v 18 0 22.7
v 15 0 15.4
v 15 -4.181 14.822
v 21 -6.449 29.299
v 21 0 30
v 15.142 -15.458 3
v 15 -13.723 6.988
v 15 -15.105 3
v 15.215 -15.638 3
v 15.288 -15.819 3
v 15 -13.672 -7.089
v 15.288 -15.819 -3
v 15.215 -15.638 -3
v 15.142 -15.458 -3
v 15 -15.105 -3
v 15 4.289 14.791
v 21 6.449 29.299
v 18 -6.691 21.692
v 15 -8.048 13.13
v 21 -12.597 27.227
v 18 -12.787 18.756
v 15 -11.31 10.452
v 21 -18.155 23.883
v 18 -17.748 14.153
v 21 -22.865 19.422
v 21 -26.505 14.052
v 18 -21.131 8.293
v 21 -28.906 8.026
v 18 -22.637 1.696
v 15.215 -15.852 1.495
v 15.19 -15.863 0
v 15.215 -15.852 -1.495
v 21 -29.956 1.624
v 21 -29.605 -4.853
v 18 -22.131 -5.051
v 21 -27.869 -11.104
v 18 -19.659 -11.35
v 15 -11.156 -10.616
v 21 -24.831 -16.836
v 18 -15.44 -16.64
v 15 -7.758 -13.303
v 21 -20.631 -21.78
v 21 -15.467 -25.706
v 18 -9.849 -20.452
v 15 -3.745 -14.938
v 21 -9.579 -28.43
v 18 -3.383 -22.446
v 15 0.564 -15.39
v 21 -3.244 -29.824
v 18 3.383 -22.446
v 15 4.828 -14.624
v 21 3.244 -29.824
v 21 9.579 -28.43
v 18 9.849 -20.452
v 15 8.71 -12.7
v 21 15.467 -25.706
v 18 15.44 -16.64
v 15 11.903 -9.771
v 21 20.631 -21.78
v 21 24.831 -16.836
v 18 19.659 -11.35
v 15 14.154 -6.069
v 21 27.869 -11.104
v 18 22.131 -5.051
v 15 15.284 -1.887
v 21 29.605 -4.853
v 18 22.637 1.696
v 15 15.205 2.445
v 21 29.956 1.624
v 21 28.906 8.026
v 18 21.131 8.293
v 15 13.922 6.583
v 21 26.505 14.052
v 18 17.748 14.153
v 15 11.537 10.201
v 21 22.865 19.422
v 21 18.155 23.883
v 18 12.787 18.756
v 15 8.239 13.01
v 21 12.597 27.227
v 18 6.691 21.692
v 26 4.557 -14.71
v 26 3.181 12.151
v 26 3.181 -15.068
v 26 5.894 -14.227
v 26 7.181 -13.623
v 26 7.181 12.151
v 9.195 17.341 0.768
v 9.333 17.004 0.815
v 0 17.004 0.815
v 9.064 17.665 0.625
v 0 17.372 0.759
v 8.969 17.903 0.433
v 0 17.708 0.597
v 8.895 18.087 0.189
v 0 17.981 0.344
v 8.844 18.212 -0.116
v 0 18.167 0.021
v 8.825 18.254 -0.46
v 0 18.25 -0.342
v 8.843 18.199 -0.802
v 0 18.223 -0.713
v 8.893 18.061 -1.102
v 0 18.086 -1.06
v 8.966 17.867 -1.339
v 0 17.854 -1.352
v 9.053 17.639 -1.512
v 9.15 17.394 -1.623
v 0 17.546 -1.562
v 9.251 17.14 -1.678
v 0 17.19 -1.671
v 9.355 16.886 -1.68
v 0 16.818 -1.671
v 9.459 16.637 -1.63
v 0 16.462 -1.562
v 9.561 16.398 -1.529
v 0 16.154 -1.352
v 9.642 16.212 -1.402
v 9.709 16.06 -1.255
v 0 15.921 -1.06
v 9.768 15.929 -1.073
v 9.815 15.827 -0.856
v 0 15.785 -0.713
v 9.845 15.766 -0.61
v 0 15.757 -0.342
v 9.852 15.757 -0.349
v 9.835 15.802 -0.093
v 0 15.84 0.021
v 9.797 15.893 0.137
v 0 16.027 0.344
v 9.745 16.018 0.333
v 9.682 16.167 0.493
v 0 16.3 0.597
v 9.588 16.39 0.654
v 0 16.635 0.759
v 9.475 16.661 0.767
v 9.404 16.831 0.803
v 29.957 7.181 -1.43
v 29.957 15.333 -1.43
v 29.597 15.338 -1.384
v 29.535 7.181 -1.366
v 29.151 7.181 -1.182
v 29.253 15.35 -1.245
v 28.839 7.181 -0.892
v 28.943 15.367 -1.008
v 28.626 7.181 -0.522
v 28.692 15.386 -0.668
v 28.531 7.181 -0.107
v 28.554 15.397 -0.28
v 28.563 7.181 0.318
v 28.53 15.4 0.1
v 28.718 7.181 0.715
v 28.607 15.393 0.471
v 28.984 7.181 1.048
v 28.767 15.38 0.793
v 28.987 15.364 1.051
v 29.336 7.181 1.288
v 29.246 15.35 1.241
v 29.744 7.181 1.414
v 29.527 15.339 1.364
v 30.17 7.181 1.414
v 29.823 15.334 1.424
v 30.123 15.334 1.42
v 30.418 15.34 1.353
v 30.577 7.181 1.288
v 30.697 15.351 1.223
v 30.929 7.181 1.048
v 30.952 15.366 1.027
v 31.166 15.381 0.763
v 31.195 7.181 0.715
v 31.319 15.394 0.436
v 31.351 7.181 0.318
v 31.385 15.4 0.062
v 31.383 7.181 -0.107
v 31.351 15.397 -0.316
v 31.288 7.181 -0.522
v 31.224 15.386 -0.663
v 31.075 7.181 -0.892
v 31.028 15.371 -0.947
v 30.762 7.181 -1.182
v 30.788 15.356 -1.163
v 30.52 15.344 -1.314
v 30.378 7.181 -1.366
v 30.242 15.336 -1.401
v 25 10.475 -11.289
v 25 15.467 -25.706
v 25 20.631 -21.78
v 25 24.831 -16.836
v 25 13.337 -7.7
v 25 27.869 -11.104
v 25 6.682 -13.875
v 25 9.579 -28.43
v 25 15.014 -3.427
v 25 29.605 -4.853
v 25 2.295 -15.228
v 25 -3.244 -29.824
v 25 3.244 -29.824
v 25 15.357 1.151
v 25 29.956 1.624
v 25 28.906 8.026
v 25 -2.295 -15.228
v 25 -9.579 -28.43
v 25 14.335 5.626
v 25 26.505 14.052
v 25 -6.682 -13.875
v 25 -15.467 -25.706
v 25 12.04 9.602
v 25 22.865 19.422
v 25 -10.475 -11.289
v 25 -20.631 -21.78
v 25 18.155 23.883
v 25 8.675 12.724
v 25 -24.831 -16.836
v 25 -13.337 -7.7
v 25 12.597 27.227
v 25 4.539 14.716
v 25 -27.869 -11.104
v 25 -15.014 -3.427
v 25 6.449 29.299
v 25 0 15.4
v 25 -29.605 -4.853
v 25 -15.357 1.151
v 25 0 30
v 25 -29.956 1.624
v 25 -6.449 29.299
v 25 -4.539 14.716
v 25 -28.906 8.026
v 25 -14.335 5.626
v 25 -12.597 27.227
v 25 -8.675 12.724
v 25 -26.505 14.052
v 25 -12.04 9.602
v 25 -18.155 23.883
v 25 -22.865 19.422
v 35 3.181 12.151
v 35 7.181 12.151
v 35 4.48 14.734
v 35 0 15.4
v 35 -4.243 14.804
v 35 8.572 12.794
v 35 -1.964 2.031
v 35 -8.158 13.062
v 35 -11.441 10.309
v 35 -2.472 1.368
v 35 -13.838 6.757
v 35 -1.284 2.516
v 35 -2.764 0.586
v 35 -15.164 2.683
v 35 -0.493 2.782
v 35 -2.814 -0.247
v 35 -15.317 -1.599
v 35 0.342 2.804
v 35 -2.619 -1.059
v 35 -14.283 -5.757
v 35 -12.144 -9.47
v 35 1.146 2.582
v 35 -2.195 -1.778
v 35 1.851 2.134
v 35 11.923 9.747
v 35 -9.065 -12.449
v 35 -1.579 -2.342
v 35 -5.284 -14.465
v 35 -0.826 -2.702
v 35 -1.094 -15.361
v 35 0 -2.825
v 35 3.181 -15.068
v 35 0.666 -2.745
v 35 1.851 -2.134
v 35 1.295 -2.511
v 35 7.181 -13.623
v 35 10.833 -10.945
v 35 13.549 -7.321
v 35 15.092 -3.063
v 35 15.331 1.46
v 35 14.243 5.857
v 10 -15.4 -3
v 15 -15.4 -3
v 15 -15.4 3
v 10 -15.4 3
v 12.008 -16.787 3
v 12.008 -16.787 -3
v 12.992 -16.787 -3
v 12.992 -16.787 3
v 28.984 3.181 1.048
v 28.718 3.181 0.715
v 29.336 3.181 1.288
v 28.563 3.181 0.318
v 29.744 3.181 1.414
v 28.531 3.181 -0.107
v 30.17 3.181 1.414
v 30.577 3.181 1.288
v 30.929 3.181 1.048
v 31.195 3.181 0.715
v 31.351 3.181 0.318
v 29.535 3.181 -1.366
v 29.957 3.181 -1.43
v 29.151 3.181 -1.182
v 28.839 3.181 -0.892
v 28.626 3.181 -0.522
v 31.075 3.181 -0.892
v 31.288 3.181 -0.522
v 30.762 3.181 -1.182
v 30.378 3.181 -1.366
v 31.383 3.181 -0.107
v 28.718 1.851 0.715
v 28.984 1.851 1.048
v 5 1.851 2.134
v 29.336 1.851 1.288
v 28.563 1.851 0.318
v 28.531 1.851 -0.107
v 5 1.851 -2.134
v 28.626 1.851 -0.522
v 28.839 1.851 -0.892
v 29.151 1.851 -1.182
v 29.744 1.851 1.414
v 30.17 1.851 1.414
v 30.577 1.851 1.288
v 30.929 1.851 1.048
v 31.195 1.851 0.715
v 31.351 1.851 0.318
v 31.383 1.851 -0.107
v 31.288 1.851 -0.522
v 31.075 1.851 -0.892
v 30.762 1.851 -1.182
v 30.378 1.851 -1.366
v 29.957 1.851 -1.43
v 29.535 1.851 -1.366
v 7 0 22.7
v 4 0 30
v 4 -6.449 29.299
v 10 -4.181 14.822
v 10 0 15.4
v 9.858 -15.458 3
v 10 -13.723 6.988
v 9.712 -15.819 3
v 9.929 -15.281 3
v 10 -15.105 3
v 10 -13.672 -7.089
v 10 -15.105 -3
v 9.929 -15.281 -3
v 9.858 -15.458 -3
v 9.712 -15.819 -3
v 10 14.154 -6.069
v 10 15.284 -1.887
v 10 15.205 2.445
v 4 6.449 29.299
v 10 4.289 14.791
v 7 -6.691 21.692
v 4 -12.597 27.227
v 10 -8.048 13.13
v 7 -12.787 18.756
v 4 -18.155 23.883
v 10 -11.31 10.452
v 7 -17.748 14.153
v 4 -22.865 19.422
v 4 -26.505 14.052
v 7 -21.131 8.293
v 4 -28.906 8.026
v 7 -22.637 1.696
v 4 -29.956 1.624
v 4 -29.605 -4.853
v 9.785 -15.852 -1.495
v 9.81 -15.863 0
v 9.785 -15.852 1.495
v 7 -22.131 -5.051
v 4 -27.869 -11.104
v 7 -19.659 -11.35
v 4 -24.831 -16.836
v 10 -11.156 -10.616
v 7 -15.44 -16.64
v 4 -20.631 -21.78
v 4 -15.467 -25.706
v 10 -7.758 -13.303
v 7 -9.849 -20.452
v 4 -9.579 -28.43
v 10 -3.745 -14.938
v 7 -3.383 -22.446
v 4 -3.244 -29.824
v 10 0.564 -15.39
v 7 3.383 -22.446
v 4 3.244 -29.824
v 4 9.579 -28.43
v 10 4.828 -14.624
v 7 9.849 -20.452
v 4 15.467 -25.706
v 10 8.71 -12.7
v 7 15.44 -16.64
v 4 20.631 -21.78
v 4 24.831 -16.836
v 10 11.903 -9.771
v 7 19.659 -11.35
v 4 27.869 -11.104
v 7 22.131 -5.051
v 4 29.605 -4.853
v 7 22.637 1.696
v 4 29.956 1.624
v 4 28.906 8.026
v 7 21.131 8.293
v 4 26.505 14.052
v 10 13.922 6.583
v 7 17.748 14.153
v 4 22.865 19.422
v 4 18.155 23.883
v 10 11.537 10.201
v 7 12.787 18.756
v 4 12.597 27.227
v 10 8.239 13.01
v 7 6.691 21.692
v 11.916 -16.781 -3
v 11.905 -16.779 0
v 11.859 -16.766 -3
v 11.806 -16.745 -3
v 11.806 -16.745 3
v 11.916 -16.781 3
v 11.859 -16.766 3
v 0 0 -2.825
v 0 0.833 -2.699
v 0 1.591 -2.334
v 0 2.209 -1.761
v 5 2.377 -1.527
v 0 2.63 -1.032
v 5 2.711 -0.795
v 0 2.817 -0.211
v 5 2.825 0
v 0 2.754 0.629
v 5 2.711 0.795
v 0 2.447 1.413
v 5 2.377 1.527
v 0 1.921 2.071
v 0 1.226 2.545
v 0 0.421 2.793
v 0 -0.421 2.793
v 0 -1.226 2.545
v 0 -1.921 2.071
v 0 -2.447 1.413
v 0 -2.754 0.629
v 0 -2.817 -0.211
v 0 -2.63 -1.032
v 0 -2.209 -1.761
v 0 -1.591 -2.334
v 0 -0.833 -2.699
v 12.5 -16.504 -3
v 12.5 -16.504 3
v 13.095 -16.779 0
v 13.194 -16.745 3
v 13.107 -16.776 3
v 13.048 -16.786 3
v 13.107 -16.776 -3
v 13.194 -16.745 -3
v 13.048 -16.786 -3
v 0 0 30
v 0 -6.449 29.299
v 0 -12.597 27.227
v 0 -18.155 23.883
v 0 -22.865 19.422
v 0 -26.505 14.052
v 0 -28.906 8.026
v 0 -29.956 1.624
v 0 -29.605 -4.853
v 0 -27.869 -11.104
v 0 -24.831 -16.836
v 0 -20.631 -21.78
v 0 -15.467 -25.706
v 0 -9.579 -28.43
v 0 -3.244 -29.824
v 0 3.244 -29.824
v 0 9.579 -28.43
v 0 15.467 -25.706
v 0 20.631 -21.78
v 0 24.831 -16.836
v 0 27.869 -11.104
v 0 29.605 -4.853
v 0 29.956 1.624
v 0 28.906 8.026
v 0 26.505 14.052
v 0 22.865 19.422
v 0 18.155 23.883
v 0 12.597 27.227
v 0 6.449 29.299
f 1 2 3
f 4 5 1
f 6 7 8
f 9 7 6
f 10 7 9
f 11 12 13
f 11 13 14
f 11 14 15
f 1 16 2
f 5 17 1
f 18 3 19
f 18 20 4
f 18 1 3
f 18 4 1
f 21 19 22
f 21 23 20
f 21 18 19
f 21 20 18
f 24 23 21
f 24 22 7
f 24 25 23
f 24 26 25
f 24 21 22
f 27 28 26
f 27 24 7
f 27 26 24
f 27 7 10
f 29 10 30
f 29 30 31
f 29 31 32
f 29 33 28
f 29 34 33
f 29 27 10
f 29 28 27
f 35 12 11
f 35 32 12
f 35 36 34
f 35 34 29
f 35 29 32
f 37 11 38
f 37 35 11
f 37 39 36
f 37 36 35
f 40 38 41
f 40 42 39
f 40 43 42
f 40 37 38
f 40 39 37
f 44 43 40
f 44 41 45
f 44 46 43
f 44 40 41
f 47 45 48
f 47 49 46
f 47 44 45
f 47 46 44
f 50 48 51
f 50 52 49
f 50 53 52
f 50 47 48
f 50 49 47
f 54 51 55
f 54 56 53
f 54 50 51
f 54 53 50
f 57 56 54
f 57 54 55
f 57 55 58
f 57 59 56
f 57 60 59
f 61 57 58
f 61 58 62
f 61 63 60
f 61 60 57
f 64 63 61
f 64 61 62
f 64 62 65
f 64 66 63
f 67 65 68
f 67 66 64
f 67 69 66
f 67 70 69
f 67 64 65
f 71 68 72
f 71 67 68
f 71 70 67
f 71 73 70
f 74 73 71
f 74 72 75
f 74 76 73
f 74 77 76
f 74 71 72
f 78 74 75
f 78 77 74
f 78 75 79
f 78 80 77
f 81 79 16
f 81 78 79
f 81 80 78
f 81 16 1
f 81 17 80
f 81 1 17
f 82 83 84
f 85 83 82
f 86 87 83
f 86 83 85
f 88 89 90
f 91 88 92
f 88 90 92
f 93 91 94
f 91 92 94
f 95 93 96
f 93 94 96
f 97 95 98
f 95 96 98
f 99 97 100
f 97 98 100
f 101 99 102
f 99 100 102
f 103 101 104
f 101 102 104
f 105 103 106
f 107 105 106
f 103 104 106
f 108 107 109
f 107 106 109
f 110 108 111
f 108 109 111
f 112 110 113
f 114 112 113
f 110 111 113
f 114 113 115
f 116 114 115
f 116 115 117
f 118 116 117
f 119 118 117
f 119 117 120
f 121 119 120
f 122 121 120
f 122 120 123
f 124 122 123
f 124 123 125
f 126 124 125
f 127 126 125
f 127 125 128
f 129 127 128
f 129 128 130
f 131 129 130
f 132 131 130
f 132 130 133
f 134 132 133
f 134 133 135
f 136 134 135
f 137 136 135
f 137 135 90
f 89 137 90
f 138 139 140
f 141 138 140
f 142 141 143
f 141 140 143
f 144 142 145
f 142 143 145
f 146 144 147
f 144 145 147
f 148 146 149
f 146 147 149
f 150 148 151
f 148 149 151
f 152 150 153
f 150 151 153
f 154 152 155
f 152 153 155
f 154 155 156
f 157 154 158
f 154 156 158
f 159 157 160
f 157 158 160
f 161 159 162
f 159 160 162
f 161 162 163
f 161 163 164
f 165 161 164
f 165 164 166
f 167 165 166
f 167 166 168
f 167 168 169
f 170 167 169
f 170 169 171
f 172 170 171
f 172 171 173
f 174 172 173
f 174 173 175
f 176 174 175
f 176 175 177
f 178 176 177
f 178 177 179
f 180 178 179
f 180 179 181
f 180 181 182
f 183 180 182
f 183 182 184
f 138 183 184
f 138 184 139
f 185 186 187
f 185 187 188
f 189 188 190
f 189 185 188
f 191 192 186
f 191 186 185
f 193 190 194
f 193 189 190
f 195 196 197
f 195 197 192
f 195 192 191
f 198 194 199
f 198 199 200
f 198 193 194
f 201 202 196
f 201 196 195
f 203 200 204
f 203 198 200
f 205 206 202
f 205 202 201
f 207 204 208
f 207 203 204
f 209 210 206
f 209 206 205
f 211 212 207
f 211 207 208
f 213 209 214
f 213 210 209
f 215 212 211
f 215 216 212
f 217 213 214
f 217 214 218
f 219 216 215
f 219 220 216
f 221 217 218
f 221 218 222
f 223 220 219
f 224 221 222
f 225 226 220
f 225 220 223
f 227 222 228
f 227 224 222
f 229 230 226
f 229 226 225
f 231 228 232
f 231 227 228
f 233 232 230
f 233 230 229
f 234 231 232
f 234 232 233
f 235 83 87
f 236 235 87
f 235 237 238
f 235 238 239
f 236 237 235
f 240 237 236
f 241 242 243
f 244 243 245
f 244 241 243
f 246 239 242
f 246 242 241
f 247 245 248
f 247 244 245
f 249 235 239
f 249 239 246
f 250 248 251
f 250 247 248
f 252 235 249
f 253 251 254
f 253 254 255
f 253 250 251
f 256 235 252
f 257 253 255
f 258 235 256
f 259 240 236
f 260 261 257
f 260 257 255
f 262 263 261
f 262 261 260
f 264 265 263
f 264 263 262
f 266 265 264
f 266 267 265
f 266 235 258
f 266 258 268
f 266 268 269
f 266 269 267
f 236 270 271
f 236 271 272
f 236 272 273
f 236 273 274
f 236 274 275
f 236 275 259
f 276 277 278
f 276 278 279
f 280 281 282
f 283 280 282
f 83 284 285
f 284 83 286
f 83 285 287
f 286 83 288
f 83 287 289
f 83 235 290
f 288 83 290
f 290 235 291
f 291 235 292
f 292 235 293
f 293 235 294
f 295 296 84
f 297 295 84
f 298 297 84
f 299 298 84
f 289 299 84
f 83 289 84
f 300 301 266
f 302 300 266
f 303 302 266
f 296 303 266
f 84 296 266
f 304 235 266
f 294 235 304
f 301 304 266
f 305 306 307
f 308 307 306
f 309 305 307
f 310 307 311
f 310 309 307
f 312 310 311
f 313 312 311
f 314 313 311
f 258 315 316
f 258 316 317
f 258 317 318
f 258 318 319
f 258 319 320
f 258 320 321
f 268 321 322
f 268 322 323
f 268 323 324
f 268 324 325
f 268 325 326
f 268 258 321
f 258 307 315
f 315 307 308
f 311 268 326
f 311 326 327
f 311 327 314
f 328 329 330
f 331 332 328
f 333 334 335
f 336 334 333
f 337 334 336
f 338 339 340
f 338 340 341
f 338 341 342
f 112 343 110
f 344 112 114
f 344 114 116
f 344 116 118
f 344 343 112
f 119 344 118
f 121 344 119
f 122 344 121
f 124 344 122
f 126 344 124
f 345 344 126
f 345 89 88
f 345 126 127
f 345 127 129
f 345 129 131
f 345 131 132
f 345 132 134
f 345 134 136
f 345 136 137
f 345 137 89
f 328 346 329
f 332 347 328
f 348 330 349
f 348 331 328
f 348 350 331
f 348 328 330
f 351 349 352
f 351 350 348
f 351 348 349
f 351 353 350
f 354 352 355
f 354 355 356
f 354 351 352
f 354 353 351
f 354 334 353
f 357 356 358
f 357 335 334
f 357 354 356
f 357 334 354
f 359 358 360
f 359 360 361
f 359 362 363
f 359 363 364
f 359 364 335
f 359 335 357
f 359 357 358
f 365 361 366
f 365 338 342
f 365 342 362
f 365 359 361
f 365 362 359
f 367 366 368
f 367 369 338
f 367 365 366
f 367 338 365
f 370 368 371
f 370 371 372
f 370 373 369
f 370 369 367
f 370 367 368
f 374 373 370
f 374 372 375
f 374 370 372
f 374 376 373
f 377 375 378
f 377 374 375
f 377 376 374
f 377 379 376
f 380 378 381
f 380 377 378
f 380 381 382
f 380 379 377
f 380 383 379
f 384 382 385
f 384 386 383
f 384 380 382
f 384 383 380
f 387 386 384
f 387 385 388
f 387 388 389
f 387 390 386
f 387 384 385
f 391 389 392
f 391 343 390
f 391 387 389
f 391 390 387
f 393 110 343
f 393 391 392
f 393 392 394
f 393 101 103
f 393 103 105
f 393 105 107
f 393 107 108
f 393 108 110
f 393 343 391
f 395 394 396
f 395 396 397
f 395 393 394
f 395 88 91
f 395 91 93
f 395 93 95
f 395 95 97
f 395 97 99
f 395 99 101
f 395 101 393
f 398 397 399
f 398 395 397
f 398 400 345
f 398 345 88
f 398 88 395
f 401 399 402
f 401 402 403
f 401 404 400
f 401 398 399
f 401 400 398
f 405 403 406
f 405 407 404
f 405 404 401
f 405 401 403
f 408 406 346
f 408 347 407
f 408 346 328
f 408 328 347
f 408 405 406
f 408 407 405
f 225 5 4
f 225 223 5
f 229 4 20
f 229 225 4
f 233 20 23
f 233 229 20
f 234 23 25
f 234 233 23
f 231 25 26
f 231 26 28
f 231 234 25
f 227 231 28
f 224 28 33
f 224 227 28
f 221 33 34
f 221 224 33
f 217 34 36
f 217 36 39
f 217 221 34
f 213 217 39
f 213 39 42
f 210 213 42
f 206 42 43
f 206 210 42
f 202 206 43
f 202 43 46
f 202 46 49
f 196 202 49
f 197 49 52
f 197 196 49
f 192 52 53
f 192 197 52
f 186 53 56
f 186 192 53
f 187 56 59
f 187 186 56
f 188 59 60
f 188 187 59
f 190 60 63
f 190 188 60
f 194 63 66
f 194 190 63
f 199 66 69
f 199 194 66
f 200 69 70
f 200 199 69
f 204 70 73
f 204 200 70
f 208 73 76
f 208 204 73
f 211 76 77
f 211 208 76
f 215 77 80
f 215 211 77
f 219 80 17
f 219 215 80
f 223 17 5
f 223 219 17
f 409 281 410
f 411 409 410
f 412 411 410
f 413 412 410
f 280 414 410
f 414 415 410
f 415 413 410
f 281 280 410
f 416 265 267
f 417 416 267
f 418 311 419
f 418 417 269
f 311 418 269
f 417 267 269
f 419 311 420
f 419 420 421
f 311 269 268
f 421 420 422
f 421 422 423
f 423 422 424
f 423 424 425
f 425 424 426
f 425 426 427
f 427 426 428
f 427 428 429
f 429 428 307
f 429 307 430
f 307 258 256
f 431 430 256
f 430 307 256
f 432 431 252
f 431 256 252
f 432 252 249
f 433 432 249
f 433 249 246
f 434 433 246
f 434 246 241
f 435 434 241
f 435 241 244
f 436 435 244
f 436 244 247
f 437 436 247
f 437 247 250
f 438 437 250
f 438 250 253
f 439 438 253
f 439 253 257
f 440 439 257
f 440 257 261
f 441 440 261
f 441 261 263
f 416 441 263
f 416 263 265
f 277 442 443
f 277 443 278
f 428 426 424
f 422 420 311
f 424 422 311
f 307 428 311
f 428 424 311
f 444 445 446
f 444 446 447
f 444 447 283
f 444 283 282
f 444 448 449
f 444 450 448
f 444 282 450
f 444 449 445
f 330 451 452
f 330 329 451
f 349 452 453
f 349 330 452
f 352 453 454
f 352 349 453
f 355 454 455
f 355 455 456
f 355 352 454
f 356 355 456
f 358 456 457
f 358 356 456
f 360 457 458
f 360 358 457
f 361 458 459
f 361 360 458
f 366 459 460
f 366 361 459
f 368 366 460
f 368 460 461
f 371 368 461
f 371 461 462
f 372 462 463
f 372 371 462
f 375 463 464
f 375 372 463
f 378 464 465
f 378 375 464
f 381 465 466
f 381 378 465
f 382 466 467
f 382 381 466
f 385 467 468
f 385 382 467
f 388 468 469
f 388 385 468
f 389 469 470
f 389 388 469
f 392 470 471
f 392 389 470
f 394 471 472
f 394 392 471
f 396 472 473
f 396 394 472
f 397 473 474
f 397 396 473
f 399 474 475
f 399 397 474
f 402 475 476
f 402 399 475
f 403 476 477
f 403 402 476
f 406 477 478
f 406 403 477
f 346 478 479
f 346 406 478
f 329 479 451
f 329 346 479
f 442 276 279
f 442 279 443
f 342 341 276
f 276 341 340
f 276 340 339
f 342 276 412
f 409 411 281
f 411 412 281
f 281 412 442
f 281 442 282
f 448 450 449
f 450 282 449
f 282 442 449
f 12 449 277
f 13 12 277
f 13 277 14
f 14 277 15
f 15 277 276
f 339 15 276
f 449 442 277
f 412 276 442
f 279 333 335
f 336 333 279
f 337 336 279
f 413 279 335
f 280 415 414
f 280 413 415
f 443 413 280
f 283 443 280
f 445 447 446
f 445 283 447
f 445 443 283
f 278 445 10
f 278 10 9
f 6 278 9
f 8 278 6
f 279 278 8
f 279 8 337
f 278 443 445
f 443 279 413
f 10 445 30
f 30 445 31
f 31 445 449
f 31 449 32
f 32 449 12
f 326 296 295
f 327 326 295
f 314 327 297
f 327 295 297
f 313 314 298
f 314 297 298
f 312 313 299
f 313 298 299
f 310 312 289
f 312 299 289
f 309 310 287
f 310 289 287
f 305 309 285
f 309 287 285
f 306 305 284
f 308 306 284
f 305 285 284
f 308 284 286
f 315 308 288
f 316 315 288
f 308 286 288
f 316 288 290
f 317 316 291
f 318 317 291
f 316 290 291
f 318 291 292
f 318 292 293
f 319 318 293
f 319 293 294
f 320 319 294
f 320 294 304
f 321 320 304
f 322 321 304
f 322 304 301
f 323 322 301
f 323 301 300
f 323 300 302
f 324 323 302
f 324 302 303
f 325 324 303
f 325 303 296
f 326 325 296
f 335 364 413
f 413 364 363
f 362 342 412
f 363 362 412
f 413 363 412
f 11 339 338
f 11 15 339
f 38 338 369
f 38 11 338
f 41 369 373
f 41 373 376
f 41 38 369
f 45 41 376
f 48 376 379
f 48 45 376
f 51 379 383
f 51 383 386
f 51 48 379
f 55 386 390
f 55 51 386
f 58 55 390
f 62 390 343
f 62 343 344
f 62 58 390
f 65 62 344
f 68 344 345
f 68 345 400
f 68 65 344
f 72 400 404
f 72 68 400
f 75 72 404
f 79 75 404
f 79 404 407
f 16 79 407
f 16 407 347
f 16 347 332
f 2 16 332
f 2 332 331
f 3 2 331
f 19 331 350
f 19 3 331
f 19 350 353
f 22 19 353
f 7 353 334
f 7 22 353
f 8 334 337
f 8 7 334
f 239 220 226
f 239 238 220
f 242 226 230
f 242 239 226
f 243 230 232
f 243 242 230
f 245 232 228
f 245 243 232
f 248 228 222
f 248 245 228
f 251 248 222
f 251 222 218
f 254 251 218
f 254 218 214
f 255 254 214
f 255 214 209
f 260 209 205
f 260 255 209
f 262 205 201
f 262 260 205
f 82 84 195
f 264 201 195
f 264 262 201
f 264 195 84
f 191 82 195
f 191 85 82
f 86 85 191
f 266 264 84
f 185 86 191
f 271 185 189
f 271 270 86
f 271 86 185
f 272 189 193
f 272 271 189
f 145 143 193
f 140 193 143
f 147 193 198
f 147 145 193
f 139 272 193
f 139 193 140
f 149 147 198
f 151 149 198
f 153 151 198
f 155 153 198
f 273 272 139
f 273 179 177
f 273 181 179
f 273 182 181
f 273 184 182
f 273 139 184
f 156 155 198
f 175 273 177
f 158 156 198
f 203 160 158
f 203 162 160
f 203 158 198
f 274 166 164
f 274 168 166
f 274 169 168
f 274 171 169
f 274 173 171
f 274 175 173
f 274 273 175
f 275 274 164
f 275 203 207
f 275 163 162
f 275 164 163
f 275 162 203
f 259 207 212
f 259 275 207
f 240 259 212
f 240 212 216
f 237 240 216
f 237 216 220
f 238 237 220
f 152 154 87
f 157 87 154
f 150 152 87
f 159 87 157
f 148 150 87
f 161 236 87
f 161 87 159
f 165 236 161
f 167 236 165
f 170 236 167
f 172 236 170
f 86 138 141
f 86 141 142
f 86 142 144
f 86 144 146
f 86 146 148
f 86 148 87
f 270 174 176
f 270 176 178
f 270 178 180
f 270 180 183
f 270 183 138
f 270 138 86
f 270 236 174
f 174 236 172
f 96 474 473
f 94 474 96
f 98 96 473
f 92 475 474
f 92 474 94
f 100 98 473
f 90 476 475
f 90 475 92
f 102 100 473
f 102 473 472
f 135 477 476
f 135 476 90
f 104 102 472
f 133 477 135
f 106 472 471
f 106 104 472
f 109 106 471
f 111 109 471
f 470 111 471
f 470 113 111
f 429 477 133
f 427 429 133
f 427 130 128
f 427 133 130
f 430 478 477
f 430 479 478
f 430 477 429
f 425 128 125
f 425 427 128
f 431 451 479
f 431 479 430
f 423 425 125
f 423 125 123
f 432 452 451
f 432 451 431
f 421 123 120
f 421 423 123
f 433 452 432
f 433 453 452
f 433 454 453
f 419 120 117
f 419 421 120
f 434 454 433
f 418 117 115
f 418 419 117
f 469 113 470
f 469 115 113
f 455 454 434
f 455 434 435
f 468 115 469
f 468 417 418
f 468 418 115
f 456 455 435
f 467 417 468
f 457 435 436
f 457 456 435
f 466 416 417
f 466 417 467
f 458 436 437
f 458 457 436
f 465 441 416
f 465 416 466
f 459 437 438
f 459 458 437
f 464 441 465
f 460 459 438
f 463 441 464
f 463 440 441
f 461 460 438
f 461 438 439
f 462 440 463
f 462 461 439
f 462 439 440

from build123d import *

# Parameters (mm, degrees)
SKETCH_3_R                = 2.825
CUT_EXTRUDE_2_DEPTH       = 35
SKETCH_14_R               = 1.25
CUT_EXTRUDE_5_DEPTH       = 12
SKETCH_16_W               = 5.008881277
SKETCH_16_H               = 1
EXTRUDE_2_DEPTH           = 30
SKETCH_19_W               = 0.959066555
SKETCH_19_H               = 0.511502163
EXTRUDE_3_DEPTH           = 30
SKETCH_24_W               = 27.218976977
SKETCH_24_H               = 4
CUT_EXTRUDE_8_DEPTH       = 9
SKETCH_25_R               = 1.43
CUT_EXTRUDE_9_DEPTH       = 22
EXTRUDE_4_DEPTH           = 3
EXTRUDE_4_DEPTH_BACK      = 3
CUT_EXTRUDE_12_DEPTH      = 3
CUT_EXTRUDE_12_DEPTH_BACK = 3


with BuildPart() as part:
    # 草圖1 → 旋轉1 (revolve)
    with BuildSketch(Plane.XY, mode=Mode.PRIVATE) as revolve_1_sk:
        Polygon((0, 0), (0, 30), (4, 30), (10, 15.4), (15, 15.4), (21, 30), (25, 30), (25, 15.4), (35, 15.4), (35, 0), align=None)
    revolve(revolve_1_sk.sketch.rotate(Axis((-743.15639781, 0, 0), (1, 0, 0)), 90), axis=Axis((-743.15639781, 0, 0), (1, 0, 0)))

    # 草圖3 → 除料-伸長2 (cut)
    with BuildSketch(Plane(origin=(35, 0, 0), x_dir=(0, 0, -1), z_dir=(1, 0, 0))):
        Circle(SKETCH_3_R)
    extrude(amount=-CUT_EXTRUDE_2_DEPTH, mode=Mode.SUBTRACT)

    # 草圖14 → 除料-伸長5 (cut)
    with BuildSketch(Plane.ZY):
        with Locations((-0.435299539, 17.00388826)):
            Circle(SKETCH_14_R)
    extrude(amount=-CUT_EXTRUDE_5_DEPTH, mode=Mode.SUBTRACT)

    # 草圖16 → 填料-伸長2 (add)
    with BuildSketch(Plane(origin=(35, 0, 0), x_dir=(0, 0, -1), z_dir=(1, 0, 0))):
        with Locations((-0.105543204, 2.350977924)):
            Rectangle(SKETCH_16_W, SKETCH_16_H)
    extrude(amount=-EXTRUDE_2_DEPTH)

    # 草圖19 → 填料-伸長3 (add)
    with BuildSketch(Plane(origin=(35, 0, 0), x_dir=(0, 0, -1), z_dir=(1, 0, 0))):
        with Locations((-0.084116996, 2.673942601)):
            Rectangle(SKETCH_19_W, SKETCH_19_H)
    extrude(amount=-EXTRUDE_3_DEPTH)

    # 草圖24 → 除料-伸長8 (cut)
    with BuildSketch(Plane(origin=(35, 0, 0), x_dir=(0, 0, -1), z_dir=(1, 0, 0))):
        with Locations((1.458428344, 5.180861889)):
            Rectangle(SKETCH_24_W, SKETCH_24_H)
    extrude(amount=-CUT_EXTRUDE_8_DEPTH, mode=Mode.SUBTRACT)

    # 草圖25 → 除料-伸長9 (cut)
    with BuildSketch(Plane(origin=(0, 22, 0), x_dir=(1, 0, 0), z_dir=(0, 1, 0))):
        with Locations(Location((29.956679037, 0, 0), (0, 0, 90))):
            Circle(SKETCH_25_R)
    extrude(amount=-CUT_EXTRUDE_9_DEPTH, mode=Mode.SUBTRACT)

    # 草圖35 → 伸長-薄件4 (add, two sides: drawn at the far end of the back side and taken through both)
    with BuildSketch(Plane.XY.offset(-EXTRUDE_4_DEPTH_BACK)):
        Polygon((17.369423388, -14.9), (7.630576612, -14.9), (12.5, -17.050888526), align=None)
        Polygon((15, -15.4), (10, -15.4), (12.5, -16.504282968), align=None, mode=Mode.SUBTRACT)
    extrude(amount=EXTRUDE_4_DEPTH + EXTRUDE_4_DEPTH_BACK)

    # 草圖36 → 除料-伸長12 (cut, two sides: drawn at the far end of the back side and taken through both)
    with BuildSketch(Plane.XY.offset(-CUT_EXTRUDE_12_DEPTH_BACK)):
        Polygon((11.902920357, -16.787150573), (13.343105155, -16.787150573), (13.343105155, -17.362903865), (11.859661783, -17.362903865), align=None)
    extrude(amount=CUT_EXTRUDE_12_DEPTH + CUT_EXTRUDE_12_DEPTH_BACK, mode=Mode.SUBTRACT)

    # 圓角14
    # a fillet whose section is not a circle: 0.5 mm, written as the material it takes off along each edge
    with BuildSketch(Plane(origin=(11.902920357, -16.787150573, -3.263777256), x_dir=(-0.9147364009889508, 0.4040511313012026, 0), z_dir=(0, 0, 1))) as fillet_14_piece_1:
        with BuildLine():
            add(Edge.make_bspline([(0.105510902, 0), (0.085856889, 0), (0.066202875, 0), (0.022459615, -0.001857581), (-0.01979407, -0.01077403), (-0.060558179, -0.026749346), (-0.078536421, -0.034690573), (-0.096514663, -0.0426318)], knots=[0, 0, 0, 0, 0, 0, 0.5, 0.5, 1, 1, 1, 1, 1, 1], degree=5))
            Line((-0.096514663, -0.0426318), (0, 0))
            Line((0, 0), (0.105510902, 0))
        make_face()
    extrude(amount=6.527554512, mode=Mode.SUBTRACT)
    with BuildSketch(Plane(origin=(13.097079643, -16.787150573, 3.263777256), x_dir=(-1, 0, 0), z_dir=(0, 0, -1))) as fillet_14_piece_2:
        with BuildLine():
            add(Edge.make_bspline([(0.105510902, 0), (0.085856889, 0), (0.066202875, 0), (0.022459615, 0.001857581), (-0.01979407, 0.01077403), (-0.060558179, 0.026749346), (-0.078536421, 0.034690573), (-0.096514663, 0.0426318)], knots=[0, 0, 0, 0, 0, 0, 0.5, 0.5, 1, 1, 1, 1, 1, 1], degree=5))
            Line((-0.096514663, 0.0426318), (0, 0))
            Line((0, 0), (0.105510902, 0))
        make_face()
    extrude(amount=6.527554512, mode=Mode.SUBTRACT)


solid = part.part
